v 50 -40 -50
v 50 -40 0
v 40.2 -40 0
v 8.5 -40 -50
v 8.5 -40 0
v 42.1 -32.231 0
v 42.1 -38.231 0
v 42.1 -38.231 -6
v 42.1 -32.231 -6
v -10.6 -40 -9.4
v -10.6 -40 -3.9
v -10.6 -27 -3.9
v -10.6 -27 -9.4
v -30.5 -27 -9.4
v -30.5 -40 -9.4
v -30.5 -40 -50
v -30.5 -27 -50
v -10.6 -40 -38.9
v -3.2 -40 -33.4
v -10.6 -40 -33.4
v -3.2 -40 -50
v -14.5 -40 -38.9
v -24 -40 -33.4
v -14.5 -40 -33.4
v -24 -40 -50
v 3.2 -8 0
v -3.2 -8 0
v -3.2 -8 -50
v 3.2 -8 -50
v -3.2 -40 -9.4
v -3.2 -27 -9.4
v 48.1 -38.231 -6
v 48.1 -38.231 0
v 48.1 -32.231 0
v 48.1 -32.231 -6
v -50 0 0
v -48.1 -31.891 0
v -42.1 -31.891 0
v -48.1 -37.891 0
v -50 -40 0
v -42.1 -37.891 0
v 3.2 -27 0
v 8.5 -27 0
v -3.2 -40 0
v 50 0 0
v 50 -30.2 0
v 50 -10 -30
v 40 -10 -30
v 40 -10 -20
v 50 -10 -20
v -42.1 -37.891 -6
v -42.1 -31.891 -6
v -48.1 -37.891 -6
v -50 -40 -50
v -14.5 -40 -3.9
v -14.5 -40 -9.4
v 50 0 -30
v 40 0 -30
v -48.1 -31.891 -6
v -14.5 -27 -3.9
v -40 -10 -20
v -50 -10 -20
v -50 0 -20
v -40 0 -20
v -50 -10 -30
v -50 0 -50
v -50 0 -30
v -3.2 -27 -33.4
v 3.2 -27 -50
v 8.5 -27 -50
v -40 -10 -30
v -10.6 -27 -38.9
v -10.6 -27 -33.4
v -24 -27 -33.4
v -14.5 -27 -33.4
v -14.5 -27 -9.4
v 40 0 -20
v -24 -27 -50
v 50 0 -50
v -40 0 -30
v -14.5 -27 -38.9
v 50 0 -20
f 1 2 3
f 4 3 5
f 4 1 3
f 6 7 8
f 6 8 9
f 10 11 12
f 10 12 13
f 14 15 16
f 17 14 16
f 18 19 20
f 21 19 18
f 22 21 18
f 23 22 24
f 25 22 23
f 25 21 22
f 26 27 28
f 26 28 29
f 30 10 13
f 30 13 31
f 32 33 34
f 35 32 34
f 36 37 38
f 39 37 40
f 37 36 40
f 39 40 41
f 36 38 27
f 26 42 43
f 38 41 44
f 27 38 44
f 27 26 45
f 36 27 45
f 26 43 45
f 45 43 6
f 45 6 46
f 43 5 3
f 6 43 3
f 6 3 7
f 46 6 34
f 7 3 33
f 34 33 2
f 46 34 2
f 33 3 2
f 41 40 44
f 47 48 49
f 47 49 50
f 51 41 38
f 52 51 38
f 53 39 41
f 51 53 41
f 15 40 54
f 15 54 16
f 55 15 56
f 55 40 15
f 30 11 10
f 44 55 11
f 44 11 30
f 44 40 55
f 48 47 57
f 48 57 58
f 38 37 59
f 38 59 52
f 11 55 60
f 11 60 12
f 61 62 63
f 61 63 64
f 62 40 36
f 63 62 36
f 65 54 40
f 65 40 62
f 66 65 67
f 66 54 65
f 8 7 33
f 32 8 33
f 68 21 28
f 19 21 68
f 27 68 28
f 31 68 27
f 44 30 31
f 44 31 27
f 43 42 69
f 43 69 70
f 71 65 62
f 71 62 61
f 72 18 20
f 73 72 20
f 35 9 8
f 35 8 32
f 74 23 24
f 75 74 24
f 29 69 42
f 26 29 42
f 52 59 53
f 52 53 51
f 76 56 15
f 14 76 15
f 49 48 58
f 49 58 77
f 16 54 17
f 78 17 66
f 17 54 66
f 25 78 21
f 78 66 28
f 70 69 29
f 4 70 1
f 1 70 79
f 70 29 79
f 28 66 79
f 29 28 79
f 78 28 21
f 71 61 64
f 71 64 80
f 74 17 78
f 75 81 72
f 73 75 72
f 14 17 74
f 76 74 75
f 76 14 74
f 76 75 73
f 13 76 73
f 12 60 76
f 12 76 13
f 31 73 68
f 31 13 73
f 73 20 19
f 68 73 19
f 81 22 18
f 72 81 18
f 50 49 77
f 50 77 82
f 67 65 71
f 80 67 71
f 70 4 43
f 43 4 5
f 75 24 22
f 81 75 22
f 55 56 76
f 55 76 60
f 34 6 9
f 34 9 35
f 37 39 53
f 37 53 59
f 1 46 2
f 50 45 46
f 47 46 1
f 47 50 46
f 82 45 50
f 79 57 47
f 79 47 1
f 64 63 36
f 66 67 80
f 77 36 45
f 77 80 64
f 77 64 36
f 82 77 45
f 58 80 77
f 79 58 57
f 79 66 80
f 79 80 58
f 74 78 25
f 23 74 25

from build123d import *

# Parameters (mm, degrees)
SKETCH1_W                = 100
SKETCH1_H                = 100
BOSS_EXTRUDE1_DEPTH      = 50
BOSS_EXTRUDE4_DEPTH      = 50
BOSS_EXTRUDE4_2_DEPTH    = 50
SKETCH11_W               = 100
SKETCH11_H               = 50
CUT_EXTRUDE4_DEPTH       = 100
SKETCH13_W               = 100
SKETCH13_H               = 10
CUT_EXTRUDE5_DEPTH       = 50
SKETCH2_W                = 50
SKETCH2_H                = 50
CUT_EXTRUDE6_DEPTH       = 25
BOSS_EXTRUDE5_DEPTH      = 19.5
CUT_EXTRUDE7_DEPTH       = 12
CUT_EXTRUDE8_DEPTH       = 32
SKETCH27_W               = 6.4
SKETCH27_H               = 32
CUT_EXTRUDE9_DEPTH       = 29
SKETCH29_W               = 6
SKETCH29_H               = 3.5
CUT_EXTRUDE10_DEPTH      = 28
SKETCH30_W               = 100
SKETCH30_H               = 50
CUT_EXTRUDE11_DEPTH      = 45
SKETCH32_W               = 9.8
SKETCH32_H               = 9.8
BOSS_EXTRUDE6_DEPTH      = 9.8
CHAMFER1_SIZE            = 1
BOSS_EXTRUDE7_DEPTH      = 13
SKETCH34_3_W             = 9.7
SKETCH34_3_H             = 8.5
SKETCH34_3_W_2           = 0.5
SKETCH34_3_H_2           = 13.5
SKETCH34_3_H_3           = 16.6
SKETCH34_3_W_3           = 6
CUT_EXTRUDE12_DEPTH      = 13
CUT_EXTRUDE13_DEPTH      = 82.240384046
CUT_EXTRUDE13_DEPTH_BACK = 10
SKETCH36_W               = 10
SKETCH36_H               = 10
SKETCH37_W               = 9.8
SKETCH37_H               = 9.8
SKETCH37_H_2             = 10.048829857
CUT_EXTRUDE15_DEPTH      = 10
SKETCH38_W               = 6
SKETCH38_H               = 6
CUT_EXTRUDE16_DEPTH      = 6
SKETCH39_W               = 6.4
SKETCH39_H               = 16.6
CUT_EXTRUDE17_DEPTH      = 32
CUT_EXTRUDE18_DEPTH      = 13


with BuildPart() as part:
    # Sketch1 → Boss-Extrude1 (new body)
    with BuildSketch(Plane(origin=(0, 0, 0), x_dir=(1, 0, 0), z_dir=(0, 1, 0))):
        Rectangle(SKETCH1_W, SKETCH1_H)
    extrude(amount=-BOSS_EXTRUDE1_DEPTH)

    # Sketch13 → Cut-Extrude5 (cut)
    with BuildSketch(Plane(origin=(0, 0, -50), x_dir=(-1, 0, 0), z_dir=(0, 0, -1))):
        with Locations((0, -45)):
            Rectangle(SKETCH13_W, SKETCH13_H)
    extrude(amount=-CUT_EXTRUDE5_DEPTH, mode=Mode.SUBTRACT)

    # Sketch2 → Cut-Extrude6 (cut)
    with BuildSketch(Plane(origin=(0, 0, 0), x_dir=(1, 0, 0), z_dir=(0, 1, 0))):
        with Locations((-25, -25)):
            Rectangle(SKETCH2_W, SKETCH2_H)
        with Locations((25, -25)):
            Rectangle(SKETCH2_W, SKETCH2_H)
    extrude(amount=-CUT_EXTRUDE6_DEPTH, mode=Mode.SUBTRACT)

    # Sketch18 → Boss-Extrude5 (add)
    with BuildSketch(Plane(origin=(0, 0, 0), x_dir=(-1, 0, 0), z_dir=(0, 0, -1))):
        Polygon((50, -50), (50, -70), (30, -50), align=None)
        Polygon((-50, -50), (-50, -69.5), (-30.5, -50), align=None)
    extrude(amount=-BOSS_EXTRUDE5_DEPTH)

    # Sketch20 → Cut-Extrude7 (cut)
    with BuildSketch(Plane.XZ.offset(40)):
        Polygon((3.2, 0), (0, 0), (-30, 0), (-30, -22.9), (-14, -22.9), (-14, -27.9), (-11.1, -27.9), (-11.1, -22.9), (-7, -22.9), (-7, -14.9), (-2.8, -14.9), (3.2, -14.9), align=None)
    extrude(amount=-CUT_EXTRUDE7_DEPTH, mode=Mode.SUBTRACT)

    # Sketch21 → Cut-Extrude8 (cut)
    with BuildSketch(Plane.XZ.offset(40)):
        Polygon((3.2, 0), (0, 0), (-3.2, 0), (-3.2, -14.9), (3.2, -14.9), align=None)
    extrude(amount=-CUT_EXTRUDE8_DEPTH, mode=Mode.SUBTRACT)

    # Sketch27 → Cut-Extrude9 (cut)
    with BuildSketch(Plane(origin=(0, 0, 0), x_dir=(-1, 0, 0), z_dir=(0, 0, -1))):
        with Locations((0, -34)):
            Rectangle(SKETCH27_W, SKETCH27_H)
    extrude(amount=-CUT_EXTRUDE9_DEPTH, mode=Mode.SUBTRACT)

    # Sketch29 → Cut-Extrude10 (cut)
    with BuildSketch(Plane(origin=(0, 0, -50), x_dir=(-1, 0, 0), z_dir=(0, 0, -1))):
        Polygon((24, -34), (24, -36.5), (30, -36.5), (30, -31.5), (24, -31.5), align=None)
        with Locations((27, -38.25)):
            Rectangle(SKETCH29_W, SKETCH29_H)
    extrude(amount=-CUT_EXTRUDE10_DEPTH, mode=Mode.SUBTRACT)

    # Sketch30 → Cut-Extrude11 (cut)
    with BuildSketch(Plane(origin=(0, -25, 0), x_dir=(1, 0, 0), z_dir=(0, 1, 0))):
        with Locations((0, -25)):
            Rectangle(SKETCH30_W, SKETCH30_H)
    extrude(amount=-CUT_EXTRUDE11_DEPTH, mode=Mode.SUBTRACT)

    # Sketch32 → Boss-Extrude6 (add)
    with BuildSketch(Plane.XY):
        with Locations((-45.1, -35.1)):
            Rectangle(SKETCH32_W, SKETCH32_H)
        with Locations((45.1, -35.1)):
            Rectangle(SKETCH32_W, SKETCH32_H)
    extrude(amount=BOSS_EXTRUDE6_DEPTH)

    # Chamfer1
    chamfer1_edges = [part.edges().sort_by_distance(p)[0] for p in [
        (-40.2, -40, 4.9),
        (-40.2, -30.2, 4.9),
        (-40.2, -35.1, 9.8),
        (40.2, -30.2, 4.9),
        (40.2, -35.1, 9.8),
    ]]
    chamfer(chamfer1_edges, length=CHAMFER1_SIZE)

    # Sketch34 → Boss-Extrude7 (add)
    with BuildSketch(Plane.XZ.offset(40)):
        Polygon((-30, 0), (-30, -9.4), (-14.5, -9.4), (-14.5, -3.9), (-10.6, -3.9), (-10.6, -9.4), (-3.2, -9.4), (-3.2, 0), align=None)
    extrude(amount=-BOSS_EXTRUDE7_DEPTH)

    # Sketch34<3> → Cut-Extrude12 (cut)
    with BuildSketch(Plane.XZ.offset(40)):
        Polygon((3.2, -9.4), (3.2, -14.9), (3.2, -24.9), (8.5, -24.9), (8.5, 0), (3.2, 0), align=None)
        Polygon((-14, -27.9), (-11.1, -27.9), (-11.1, -22.9), (-7, -22.9), (-7, -14.9), (3.2, -14.9), (3.2, -9.4), (-3.2, -9.4), (-10.6, -9.4), (-10.6, -3.9), (-14.5, -3.9), (-14.5, -9.4), (-30, -9.4), (-30, -22.9), (-24, -22.9), (-14, -22.9), align=None)
        Polygon((-11.1, -22.9), (-11.1, -27.9), (-14, -27.9), (-14, -22.9), (-24, -22.9), (-24, -33.4), (-14.5, -33.4), (-14.5, -38.9), (-10.6, -38.9), (-10.6, -33.4), (-6.5, -33.4), (-6.5, -24.9), (3.2, -24.9), (3.2, -14.9), (-7, -14.9), (-7, -22.9), align=None)
        with Locations((-1.65, -29.15)):
            Rectangle(SKETCH34_3_W, SKETCH34_3_H)
        Polygon((-24, -33.4), (-24, -22.9), (-30, -22.9), (-30.5, -22.9), (-30.5, -33.4), (-30, -33.4), align=None)
        with Locations((-30.25, -16.15)):
            Rectangle(SKETCH34_3_W_2, SKETCH34_3_H_2)
        with Locations((-30.25, -41.7)):
            Rectangle(SKETCH34_3_W_2, SKETCH34_3_H_3)
        with Locations((-27, -41.7)):
            Rectangle(SKETCH34_3_W_3, SKETCH34_3_H_3)
    extrude(amount=-CUT_EXTRUDE12_DEPTH, mode=Mode.SUBTRACT)

    # Sketch36 → Cut-Extrude13 (cut, two sides: drawn at the far end of the back side and taken through both)
    with BuildSketch(Plane(origin=(0, 0, 0), x_dir=(1, 0, 0), z_dir=(0, 1, 0)).offset(-CUT_EXTRUDE13_DEPTH_BACK)):
        with Locations((-45, 25)):
            Rectangle(SKETCH36_W, SKETCH36_H)
        Polygon((50, 20), (50, 30), (40, 30), (40, 25), (40, 20), align=None)
    extrude(amount=CUT_EXTRUDE13_DEPTH + CUT_EXTRUDE13_DEPTH_BACK, mode=Mode.SUBTRACT)

    # Sketch37 → Cut-Extrude15 (cut)
    with BuildSketch(Plane.XZ.offset(40)):
        with Locations((-45.1, 4.9)):
            Rectangle(SKETCH37_W, SKETCH37_H)
        with Locations((45.1, 5.024414929)):
            Rectangle(SKETCH37_W, SKETCH37_H_2)
    extrude(amount=-CUT_EXTRUDE15_DEPTH, mode=Mode.SUBTRACT)

    # Sketch38 → Cut-Extrude16 (cut)
    with BuildSketch(Plane.XY):
        with Locations((-45.1, -34.890503426)):
            Rectangle(SKETCH38_W, SKETCH38_H)
        with Locations((45.1, -35.230904897)):
            Rectangle(SKETCH38_W, SKETCH38_H)
    extrude(amount=-CUT_EXTRUDE16_DEPTH, mode=Mode.SUBTRACT)

    # Sketch39 → Cut-Extrude17 (cut)
    with BuildSketch(Plane.XZ.offset(40)):
        with Locations((0, -41.7)):
            Rectangle(SKETCH39_W, SKETCH39_H)
        Polygon((3.2, -14.9), (-3.2, -14.9), (-3.2, -33.4), (3.2, -33.4), (3.2, -24.9), align=None)
    extrude(amount=-CUT_EXTRUDE17_DEPTH, mode=Mode.SUBTRACT)

    # Sketch34<4> → Cut-Extrude18 (cut)
    with BuildSketch(Plane.XZ.offset(40)):
        Polygon((8.5, -24.9), (3.2, -24.9), (3.2, -33.4), (3.2, -50), (8.5, -50), align=None)
    extrude(amount=-CUT_EXTRUDE18_DEPTH, mode=Mode.SUBTRACT)


with BuildPart() as body_2:
    # Sketch6 → Boss-Extrude4 (new body)
    with BuildSketch(Plane.XY.offset(50)):
        with BuildLine():
            Line((-1.9e-08, -50), (-50, -50))
            Line((-50, -50), (-50, -63.397459622))
            ThreePointArc((-50, -63.397459622), (-25.88190452, -53.407417374), (-1.9e-08, -50))
        make_face()
    extrude(amount=-BOSS_EXTRUDE4_DEPTH)


with BuildPart() as body_3:
    # Sketch6 → Boss-Extrude4 2 (new body)
    with BuildSketch(Plane.XY.offset(50)):
        with BuildLine():
            Line((50, -50), (-1.9e-08, -50))
            ThreePointArc((-1.9e-08, -50), (25.881904501, -53.407417369), (50, -63.397459622))
            Line((50, -63.397459622), (50, -50))
        make_face()
    extrude(amount=-BOSS_EXTRUDE4_2_DEPTH)


with BuildPart() as cut_extrude4_tool:
    # Sketch11 → Cut-Extrude4 (new body)
    with BuildSketch(Plane(origin=(0, -63.397459622, 0), x_dir=(-1, 0, 0), z_dir=(0, -1, 0))):
        with Locations((0, -25)):
            Rectangle(SKETCH11_W, SKETCH11_H)
    extrude(amount=-CUT_EXTRUDE4_DEPTH)


with BuildPart() as body_2_1:
    add(body_2.part)

    # Cut-Extrude4: cut by cut_extrude4_tool
    add(cut_extrude4_tool.part, mode=Mode.SUBTRACT)


with BuildPart() as body_3_1:
    add(body_3.part)

    # Cut-Extrude4: cut by cut_extrude4_tool
    add(cut_extrude4_tool.part, mode=Mode.SUBTRACT)


solid = part.part
